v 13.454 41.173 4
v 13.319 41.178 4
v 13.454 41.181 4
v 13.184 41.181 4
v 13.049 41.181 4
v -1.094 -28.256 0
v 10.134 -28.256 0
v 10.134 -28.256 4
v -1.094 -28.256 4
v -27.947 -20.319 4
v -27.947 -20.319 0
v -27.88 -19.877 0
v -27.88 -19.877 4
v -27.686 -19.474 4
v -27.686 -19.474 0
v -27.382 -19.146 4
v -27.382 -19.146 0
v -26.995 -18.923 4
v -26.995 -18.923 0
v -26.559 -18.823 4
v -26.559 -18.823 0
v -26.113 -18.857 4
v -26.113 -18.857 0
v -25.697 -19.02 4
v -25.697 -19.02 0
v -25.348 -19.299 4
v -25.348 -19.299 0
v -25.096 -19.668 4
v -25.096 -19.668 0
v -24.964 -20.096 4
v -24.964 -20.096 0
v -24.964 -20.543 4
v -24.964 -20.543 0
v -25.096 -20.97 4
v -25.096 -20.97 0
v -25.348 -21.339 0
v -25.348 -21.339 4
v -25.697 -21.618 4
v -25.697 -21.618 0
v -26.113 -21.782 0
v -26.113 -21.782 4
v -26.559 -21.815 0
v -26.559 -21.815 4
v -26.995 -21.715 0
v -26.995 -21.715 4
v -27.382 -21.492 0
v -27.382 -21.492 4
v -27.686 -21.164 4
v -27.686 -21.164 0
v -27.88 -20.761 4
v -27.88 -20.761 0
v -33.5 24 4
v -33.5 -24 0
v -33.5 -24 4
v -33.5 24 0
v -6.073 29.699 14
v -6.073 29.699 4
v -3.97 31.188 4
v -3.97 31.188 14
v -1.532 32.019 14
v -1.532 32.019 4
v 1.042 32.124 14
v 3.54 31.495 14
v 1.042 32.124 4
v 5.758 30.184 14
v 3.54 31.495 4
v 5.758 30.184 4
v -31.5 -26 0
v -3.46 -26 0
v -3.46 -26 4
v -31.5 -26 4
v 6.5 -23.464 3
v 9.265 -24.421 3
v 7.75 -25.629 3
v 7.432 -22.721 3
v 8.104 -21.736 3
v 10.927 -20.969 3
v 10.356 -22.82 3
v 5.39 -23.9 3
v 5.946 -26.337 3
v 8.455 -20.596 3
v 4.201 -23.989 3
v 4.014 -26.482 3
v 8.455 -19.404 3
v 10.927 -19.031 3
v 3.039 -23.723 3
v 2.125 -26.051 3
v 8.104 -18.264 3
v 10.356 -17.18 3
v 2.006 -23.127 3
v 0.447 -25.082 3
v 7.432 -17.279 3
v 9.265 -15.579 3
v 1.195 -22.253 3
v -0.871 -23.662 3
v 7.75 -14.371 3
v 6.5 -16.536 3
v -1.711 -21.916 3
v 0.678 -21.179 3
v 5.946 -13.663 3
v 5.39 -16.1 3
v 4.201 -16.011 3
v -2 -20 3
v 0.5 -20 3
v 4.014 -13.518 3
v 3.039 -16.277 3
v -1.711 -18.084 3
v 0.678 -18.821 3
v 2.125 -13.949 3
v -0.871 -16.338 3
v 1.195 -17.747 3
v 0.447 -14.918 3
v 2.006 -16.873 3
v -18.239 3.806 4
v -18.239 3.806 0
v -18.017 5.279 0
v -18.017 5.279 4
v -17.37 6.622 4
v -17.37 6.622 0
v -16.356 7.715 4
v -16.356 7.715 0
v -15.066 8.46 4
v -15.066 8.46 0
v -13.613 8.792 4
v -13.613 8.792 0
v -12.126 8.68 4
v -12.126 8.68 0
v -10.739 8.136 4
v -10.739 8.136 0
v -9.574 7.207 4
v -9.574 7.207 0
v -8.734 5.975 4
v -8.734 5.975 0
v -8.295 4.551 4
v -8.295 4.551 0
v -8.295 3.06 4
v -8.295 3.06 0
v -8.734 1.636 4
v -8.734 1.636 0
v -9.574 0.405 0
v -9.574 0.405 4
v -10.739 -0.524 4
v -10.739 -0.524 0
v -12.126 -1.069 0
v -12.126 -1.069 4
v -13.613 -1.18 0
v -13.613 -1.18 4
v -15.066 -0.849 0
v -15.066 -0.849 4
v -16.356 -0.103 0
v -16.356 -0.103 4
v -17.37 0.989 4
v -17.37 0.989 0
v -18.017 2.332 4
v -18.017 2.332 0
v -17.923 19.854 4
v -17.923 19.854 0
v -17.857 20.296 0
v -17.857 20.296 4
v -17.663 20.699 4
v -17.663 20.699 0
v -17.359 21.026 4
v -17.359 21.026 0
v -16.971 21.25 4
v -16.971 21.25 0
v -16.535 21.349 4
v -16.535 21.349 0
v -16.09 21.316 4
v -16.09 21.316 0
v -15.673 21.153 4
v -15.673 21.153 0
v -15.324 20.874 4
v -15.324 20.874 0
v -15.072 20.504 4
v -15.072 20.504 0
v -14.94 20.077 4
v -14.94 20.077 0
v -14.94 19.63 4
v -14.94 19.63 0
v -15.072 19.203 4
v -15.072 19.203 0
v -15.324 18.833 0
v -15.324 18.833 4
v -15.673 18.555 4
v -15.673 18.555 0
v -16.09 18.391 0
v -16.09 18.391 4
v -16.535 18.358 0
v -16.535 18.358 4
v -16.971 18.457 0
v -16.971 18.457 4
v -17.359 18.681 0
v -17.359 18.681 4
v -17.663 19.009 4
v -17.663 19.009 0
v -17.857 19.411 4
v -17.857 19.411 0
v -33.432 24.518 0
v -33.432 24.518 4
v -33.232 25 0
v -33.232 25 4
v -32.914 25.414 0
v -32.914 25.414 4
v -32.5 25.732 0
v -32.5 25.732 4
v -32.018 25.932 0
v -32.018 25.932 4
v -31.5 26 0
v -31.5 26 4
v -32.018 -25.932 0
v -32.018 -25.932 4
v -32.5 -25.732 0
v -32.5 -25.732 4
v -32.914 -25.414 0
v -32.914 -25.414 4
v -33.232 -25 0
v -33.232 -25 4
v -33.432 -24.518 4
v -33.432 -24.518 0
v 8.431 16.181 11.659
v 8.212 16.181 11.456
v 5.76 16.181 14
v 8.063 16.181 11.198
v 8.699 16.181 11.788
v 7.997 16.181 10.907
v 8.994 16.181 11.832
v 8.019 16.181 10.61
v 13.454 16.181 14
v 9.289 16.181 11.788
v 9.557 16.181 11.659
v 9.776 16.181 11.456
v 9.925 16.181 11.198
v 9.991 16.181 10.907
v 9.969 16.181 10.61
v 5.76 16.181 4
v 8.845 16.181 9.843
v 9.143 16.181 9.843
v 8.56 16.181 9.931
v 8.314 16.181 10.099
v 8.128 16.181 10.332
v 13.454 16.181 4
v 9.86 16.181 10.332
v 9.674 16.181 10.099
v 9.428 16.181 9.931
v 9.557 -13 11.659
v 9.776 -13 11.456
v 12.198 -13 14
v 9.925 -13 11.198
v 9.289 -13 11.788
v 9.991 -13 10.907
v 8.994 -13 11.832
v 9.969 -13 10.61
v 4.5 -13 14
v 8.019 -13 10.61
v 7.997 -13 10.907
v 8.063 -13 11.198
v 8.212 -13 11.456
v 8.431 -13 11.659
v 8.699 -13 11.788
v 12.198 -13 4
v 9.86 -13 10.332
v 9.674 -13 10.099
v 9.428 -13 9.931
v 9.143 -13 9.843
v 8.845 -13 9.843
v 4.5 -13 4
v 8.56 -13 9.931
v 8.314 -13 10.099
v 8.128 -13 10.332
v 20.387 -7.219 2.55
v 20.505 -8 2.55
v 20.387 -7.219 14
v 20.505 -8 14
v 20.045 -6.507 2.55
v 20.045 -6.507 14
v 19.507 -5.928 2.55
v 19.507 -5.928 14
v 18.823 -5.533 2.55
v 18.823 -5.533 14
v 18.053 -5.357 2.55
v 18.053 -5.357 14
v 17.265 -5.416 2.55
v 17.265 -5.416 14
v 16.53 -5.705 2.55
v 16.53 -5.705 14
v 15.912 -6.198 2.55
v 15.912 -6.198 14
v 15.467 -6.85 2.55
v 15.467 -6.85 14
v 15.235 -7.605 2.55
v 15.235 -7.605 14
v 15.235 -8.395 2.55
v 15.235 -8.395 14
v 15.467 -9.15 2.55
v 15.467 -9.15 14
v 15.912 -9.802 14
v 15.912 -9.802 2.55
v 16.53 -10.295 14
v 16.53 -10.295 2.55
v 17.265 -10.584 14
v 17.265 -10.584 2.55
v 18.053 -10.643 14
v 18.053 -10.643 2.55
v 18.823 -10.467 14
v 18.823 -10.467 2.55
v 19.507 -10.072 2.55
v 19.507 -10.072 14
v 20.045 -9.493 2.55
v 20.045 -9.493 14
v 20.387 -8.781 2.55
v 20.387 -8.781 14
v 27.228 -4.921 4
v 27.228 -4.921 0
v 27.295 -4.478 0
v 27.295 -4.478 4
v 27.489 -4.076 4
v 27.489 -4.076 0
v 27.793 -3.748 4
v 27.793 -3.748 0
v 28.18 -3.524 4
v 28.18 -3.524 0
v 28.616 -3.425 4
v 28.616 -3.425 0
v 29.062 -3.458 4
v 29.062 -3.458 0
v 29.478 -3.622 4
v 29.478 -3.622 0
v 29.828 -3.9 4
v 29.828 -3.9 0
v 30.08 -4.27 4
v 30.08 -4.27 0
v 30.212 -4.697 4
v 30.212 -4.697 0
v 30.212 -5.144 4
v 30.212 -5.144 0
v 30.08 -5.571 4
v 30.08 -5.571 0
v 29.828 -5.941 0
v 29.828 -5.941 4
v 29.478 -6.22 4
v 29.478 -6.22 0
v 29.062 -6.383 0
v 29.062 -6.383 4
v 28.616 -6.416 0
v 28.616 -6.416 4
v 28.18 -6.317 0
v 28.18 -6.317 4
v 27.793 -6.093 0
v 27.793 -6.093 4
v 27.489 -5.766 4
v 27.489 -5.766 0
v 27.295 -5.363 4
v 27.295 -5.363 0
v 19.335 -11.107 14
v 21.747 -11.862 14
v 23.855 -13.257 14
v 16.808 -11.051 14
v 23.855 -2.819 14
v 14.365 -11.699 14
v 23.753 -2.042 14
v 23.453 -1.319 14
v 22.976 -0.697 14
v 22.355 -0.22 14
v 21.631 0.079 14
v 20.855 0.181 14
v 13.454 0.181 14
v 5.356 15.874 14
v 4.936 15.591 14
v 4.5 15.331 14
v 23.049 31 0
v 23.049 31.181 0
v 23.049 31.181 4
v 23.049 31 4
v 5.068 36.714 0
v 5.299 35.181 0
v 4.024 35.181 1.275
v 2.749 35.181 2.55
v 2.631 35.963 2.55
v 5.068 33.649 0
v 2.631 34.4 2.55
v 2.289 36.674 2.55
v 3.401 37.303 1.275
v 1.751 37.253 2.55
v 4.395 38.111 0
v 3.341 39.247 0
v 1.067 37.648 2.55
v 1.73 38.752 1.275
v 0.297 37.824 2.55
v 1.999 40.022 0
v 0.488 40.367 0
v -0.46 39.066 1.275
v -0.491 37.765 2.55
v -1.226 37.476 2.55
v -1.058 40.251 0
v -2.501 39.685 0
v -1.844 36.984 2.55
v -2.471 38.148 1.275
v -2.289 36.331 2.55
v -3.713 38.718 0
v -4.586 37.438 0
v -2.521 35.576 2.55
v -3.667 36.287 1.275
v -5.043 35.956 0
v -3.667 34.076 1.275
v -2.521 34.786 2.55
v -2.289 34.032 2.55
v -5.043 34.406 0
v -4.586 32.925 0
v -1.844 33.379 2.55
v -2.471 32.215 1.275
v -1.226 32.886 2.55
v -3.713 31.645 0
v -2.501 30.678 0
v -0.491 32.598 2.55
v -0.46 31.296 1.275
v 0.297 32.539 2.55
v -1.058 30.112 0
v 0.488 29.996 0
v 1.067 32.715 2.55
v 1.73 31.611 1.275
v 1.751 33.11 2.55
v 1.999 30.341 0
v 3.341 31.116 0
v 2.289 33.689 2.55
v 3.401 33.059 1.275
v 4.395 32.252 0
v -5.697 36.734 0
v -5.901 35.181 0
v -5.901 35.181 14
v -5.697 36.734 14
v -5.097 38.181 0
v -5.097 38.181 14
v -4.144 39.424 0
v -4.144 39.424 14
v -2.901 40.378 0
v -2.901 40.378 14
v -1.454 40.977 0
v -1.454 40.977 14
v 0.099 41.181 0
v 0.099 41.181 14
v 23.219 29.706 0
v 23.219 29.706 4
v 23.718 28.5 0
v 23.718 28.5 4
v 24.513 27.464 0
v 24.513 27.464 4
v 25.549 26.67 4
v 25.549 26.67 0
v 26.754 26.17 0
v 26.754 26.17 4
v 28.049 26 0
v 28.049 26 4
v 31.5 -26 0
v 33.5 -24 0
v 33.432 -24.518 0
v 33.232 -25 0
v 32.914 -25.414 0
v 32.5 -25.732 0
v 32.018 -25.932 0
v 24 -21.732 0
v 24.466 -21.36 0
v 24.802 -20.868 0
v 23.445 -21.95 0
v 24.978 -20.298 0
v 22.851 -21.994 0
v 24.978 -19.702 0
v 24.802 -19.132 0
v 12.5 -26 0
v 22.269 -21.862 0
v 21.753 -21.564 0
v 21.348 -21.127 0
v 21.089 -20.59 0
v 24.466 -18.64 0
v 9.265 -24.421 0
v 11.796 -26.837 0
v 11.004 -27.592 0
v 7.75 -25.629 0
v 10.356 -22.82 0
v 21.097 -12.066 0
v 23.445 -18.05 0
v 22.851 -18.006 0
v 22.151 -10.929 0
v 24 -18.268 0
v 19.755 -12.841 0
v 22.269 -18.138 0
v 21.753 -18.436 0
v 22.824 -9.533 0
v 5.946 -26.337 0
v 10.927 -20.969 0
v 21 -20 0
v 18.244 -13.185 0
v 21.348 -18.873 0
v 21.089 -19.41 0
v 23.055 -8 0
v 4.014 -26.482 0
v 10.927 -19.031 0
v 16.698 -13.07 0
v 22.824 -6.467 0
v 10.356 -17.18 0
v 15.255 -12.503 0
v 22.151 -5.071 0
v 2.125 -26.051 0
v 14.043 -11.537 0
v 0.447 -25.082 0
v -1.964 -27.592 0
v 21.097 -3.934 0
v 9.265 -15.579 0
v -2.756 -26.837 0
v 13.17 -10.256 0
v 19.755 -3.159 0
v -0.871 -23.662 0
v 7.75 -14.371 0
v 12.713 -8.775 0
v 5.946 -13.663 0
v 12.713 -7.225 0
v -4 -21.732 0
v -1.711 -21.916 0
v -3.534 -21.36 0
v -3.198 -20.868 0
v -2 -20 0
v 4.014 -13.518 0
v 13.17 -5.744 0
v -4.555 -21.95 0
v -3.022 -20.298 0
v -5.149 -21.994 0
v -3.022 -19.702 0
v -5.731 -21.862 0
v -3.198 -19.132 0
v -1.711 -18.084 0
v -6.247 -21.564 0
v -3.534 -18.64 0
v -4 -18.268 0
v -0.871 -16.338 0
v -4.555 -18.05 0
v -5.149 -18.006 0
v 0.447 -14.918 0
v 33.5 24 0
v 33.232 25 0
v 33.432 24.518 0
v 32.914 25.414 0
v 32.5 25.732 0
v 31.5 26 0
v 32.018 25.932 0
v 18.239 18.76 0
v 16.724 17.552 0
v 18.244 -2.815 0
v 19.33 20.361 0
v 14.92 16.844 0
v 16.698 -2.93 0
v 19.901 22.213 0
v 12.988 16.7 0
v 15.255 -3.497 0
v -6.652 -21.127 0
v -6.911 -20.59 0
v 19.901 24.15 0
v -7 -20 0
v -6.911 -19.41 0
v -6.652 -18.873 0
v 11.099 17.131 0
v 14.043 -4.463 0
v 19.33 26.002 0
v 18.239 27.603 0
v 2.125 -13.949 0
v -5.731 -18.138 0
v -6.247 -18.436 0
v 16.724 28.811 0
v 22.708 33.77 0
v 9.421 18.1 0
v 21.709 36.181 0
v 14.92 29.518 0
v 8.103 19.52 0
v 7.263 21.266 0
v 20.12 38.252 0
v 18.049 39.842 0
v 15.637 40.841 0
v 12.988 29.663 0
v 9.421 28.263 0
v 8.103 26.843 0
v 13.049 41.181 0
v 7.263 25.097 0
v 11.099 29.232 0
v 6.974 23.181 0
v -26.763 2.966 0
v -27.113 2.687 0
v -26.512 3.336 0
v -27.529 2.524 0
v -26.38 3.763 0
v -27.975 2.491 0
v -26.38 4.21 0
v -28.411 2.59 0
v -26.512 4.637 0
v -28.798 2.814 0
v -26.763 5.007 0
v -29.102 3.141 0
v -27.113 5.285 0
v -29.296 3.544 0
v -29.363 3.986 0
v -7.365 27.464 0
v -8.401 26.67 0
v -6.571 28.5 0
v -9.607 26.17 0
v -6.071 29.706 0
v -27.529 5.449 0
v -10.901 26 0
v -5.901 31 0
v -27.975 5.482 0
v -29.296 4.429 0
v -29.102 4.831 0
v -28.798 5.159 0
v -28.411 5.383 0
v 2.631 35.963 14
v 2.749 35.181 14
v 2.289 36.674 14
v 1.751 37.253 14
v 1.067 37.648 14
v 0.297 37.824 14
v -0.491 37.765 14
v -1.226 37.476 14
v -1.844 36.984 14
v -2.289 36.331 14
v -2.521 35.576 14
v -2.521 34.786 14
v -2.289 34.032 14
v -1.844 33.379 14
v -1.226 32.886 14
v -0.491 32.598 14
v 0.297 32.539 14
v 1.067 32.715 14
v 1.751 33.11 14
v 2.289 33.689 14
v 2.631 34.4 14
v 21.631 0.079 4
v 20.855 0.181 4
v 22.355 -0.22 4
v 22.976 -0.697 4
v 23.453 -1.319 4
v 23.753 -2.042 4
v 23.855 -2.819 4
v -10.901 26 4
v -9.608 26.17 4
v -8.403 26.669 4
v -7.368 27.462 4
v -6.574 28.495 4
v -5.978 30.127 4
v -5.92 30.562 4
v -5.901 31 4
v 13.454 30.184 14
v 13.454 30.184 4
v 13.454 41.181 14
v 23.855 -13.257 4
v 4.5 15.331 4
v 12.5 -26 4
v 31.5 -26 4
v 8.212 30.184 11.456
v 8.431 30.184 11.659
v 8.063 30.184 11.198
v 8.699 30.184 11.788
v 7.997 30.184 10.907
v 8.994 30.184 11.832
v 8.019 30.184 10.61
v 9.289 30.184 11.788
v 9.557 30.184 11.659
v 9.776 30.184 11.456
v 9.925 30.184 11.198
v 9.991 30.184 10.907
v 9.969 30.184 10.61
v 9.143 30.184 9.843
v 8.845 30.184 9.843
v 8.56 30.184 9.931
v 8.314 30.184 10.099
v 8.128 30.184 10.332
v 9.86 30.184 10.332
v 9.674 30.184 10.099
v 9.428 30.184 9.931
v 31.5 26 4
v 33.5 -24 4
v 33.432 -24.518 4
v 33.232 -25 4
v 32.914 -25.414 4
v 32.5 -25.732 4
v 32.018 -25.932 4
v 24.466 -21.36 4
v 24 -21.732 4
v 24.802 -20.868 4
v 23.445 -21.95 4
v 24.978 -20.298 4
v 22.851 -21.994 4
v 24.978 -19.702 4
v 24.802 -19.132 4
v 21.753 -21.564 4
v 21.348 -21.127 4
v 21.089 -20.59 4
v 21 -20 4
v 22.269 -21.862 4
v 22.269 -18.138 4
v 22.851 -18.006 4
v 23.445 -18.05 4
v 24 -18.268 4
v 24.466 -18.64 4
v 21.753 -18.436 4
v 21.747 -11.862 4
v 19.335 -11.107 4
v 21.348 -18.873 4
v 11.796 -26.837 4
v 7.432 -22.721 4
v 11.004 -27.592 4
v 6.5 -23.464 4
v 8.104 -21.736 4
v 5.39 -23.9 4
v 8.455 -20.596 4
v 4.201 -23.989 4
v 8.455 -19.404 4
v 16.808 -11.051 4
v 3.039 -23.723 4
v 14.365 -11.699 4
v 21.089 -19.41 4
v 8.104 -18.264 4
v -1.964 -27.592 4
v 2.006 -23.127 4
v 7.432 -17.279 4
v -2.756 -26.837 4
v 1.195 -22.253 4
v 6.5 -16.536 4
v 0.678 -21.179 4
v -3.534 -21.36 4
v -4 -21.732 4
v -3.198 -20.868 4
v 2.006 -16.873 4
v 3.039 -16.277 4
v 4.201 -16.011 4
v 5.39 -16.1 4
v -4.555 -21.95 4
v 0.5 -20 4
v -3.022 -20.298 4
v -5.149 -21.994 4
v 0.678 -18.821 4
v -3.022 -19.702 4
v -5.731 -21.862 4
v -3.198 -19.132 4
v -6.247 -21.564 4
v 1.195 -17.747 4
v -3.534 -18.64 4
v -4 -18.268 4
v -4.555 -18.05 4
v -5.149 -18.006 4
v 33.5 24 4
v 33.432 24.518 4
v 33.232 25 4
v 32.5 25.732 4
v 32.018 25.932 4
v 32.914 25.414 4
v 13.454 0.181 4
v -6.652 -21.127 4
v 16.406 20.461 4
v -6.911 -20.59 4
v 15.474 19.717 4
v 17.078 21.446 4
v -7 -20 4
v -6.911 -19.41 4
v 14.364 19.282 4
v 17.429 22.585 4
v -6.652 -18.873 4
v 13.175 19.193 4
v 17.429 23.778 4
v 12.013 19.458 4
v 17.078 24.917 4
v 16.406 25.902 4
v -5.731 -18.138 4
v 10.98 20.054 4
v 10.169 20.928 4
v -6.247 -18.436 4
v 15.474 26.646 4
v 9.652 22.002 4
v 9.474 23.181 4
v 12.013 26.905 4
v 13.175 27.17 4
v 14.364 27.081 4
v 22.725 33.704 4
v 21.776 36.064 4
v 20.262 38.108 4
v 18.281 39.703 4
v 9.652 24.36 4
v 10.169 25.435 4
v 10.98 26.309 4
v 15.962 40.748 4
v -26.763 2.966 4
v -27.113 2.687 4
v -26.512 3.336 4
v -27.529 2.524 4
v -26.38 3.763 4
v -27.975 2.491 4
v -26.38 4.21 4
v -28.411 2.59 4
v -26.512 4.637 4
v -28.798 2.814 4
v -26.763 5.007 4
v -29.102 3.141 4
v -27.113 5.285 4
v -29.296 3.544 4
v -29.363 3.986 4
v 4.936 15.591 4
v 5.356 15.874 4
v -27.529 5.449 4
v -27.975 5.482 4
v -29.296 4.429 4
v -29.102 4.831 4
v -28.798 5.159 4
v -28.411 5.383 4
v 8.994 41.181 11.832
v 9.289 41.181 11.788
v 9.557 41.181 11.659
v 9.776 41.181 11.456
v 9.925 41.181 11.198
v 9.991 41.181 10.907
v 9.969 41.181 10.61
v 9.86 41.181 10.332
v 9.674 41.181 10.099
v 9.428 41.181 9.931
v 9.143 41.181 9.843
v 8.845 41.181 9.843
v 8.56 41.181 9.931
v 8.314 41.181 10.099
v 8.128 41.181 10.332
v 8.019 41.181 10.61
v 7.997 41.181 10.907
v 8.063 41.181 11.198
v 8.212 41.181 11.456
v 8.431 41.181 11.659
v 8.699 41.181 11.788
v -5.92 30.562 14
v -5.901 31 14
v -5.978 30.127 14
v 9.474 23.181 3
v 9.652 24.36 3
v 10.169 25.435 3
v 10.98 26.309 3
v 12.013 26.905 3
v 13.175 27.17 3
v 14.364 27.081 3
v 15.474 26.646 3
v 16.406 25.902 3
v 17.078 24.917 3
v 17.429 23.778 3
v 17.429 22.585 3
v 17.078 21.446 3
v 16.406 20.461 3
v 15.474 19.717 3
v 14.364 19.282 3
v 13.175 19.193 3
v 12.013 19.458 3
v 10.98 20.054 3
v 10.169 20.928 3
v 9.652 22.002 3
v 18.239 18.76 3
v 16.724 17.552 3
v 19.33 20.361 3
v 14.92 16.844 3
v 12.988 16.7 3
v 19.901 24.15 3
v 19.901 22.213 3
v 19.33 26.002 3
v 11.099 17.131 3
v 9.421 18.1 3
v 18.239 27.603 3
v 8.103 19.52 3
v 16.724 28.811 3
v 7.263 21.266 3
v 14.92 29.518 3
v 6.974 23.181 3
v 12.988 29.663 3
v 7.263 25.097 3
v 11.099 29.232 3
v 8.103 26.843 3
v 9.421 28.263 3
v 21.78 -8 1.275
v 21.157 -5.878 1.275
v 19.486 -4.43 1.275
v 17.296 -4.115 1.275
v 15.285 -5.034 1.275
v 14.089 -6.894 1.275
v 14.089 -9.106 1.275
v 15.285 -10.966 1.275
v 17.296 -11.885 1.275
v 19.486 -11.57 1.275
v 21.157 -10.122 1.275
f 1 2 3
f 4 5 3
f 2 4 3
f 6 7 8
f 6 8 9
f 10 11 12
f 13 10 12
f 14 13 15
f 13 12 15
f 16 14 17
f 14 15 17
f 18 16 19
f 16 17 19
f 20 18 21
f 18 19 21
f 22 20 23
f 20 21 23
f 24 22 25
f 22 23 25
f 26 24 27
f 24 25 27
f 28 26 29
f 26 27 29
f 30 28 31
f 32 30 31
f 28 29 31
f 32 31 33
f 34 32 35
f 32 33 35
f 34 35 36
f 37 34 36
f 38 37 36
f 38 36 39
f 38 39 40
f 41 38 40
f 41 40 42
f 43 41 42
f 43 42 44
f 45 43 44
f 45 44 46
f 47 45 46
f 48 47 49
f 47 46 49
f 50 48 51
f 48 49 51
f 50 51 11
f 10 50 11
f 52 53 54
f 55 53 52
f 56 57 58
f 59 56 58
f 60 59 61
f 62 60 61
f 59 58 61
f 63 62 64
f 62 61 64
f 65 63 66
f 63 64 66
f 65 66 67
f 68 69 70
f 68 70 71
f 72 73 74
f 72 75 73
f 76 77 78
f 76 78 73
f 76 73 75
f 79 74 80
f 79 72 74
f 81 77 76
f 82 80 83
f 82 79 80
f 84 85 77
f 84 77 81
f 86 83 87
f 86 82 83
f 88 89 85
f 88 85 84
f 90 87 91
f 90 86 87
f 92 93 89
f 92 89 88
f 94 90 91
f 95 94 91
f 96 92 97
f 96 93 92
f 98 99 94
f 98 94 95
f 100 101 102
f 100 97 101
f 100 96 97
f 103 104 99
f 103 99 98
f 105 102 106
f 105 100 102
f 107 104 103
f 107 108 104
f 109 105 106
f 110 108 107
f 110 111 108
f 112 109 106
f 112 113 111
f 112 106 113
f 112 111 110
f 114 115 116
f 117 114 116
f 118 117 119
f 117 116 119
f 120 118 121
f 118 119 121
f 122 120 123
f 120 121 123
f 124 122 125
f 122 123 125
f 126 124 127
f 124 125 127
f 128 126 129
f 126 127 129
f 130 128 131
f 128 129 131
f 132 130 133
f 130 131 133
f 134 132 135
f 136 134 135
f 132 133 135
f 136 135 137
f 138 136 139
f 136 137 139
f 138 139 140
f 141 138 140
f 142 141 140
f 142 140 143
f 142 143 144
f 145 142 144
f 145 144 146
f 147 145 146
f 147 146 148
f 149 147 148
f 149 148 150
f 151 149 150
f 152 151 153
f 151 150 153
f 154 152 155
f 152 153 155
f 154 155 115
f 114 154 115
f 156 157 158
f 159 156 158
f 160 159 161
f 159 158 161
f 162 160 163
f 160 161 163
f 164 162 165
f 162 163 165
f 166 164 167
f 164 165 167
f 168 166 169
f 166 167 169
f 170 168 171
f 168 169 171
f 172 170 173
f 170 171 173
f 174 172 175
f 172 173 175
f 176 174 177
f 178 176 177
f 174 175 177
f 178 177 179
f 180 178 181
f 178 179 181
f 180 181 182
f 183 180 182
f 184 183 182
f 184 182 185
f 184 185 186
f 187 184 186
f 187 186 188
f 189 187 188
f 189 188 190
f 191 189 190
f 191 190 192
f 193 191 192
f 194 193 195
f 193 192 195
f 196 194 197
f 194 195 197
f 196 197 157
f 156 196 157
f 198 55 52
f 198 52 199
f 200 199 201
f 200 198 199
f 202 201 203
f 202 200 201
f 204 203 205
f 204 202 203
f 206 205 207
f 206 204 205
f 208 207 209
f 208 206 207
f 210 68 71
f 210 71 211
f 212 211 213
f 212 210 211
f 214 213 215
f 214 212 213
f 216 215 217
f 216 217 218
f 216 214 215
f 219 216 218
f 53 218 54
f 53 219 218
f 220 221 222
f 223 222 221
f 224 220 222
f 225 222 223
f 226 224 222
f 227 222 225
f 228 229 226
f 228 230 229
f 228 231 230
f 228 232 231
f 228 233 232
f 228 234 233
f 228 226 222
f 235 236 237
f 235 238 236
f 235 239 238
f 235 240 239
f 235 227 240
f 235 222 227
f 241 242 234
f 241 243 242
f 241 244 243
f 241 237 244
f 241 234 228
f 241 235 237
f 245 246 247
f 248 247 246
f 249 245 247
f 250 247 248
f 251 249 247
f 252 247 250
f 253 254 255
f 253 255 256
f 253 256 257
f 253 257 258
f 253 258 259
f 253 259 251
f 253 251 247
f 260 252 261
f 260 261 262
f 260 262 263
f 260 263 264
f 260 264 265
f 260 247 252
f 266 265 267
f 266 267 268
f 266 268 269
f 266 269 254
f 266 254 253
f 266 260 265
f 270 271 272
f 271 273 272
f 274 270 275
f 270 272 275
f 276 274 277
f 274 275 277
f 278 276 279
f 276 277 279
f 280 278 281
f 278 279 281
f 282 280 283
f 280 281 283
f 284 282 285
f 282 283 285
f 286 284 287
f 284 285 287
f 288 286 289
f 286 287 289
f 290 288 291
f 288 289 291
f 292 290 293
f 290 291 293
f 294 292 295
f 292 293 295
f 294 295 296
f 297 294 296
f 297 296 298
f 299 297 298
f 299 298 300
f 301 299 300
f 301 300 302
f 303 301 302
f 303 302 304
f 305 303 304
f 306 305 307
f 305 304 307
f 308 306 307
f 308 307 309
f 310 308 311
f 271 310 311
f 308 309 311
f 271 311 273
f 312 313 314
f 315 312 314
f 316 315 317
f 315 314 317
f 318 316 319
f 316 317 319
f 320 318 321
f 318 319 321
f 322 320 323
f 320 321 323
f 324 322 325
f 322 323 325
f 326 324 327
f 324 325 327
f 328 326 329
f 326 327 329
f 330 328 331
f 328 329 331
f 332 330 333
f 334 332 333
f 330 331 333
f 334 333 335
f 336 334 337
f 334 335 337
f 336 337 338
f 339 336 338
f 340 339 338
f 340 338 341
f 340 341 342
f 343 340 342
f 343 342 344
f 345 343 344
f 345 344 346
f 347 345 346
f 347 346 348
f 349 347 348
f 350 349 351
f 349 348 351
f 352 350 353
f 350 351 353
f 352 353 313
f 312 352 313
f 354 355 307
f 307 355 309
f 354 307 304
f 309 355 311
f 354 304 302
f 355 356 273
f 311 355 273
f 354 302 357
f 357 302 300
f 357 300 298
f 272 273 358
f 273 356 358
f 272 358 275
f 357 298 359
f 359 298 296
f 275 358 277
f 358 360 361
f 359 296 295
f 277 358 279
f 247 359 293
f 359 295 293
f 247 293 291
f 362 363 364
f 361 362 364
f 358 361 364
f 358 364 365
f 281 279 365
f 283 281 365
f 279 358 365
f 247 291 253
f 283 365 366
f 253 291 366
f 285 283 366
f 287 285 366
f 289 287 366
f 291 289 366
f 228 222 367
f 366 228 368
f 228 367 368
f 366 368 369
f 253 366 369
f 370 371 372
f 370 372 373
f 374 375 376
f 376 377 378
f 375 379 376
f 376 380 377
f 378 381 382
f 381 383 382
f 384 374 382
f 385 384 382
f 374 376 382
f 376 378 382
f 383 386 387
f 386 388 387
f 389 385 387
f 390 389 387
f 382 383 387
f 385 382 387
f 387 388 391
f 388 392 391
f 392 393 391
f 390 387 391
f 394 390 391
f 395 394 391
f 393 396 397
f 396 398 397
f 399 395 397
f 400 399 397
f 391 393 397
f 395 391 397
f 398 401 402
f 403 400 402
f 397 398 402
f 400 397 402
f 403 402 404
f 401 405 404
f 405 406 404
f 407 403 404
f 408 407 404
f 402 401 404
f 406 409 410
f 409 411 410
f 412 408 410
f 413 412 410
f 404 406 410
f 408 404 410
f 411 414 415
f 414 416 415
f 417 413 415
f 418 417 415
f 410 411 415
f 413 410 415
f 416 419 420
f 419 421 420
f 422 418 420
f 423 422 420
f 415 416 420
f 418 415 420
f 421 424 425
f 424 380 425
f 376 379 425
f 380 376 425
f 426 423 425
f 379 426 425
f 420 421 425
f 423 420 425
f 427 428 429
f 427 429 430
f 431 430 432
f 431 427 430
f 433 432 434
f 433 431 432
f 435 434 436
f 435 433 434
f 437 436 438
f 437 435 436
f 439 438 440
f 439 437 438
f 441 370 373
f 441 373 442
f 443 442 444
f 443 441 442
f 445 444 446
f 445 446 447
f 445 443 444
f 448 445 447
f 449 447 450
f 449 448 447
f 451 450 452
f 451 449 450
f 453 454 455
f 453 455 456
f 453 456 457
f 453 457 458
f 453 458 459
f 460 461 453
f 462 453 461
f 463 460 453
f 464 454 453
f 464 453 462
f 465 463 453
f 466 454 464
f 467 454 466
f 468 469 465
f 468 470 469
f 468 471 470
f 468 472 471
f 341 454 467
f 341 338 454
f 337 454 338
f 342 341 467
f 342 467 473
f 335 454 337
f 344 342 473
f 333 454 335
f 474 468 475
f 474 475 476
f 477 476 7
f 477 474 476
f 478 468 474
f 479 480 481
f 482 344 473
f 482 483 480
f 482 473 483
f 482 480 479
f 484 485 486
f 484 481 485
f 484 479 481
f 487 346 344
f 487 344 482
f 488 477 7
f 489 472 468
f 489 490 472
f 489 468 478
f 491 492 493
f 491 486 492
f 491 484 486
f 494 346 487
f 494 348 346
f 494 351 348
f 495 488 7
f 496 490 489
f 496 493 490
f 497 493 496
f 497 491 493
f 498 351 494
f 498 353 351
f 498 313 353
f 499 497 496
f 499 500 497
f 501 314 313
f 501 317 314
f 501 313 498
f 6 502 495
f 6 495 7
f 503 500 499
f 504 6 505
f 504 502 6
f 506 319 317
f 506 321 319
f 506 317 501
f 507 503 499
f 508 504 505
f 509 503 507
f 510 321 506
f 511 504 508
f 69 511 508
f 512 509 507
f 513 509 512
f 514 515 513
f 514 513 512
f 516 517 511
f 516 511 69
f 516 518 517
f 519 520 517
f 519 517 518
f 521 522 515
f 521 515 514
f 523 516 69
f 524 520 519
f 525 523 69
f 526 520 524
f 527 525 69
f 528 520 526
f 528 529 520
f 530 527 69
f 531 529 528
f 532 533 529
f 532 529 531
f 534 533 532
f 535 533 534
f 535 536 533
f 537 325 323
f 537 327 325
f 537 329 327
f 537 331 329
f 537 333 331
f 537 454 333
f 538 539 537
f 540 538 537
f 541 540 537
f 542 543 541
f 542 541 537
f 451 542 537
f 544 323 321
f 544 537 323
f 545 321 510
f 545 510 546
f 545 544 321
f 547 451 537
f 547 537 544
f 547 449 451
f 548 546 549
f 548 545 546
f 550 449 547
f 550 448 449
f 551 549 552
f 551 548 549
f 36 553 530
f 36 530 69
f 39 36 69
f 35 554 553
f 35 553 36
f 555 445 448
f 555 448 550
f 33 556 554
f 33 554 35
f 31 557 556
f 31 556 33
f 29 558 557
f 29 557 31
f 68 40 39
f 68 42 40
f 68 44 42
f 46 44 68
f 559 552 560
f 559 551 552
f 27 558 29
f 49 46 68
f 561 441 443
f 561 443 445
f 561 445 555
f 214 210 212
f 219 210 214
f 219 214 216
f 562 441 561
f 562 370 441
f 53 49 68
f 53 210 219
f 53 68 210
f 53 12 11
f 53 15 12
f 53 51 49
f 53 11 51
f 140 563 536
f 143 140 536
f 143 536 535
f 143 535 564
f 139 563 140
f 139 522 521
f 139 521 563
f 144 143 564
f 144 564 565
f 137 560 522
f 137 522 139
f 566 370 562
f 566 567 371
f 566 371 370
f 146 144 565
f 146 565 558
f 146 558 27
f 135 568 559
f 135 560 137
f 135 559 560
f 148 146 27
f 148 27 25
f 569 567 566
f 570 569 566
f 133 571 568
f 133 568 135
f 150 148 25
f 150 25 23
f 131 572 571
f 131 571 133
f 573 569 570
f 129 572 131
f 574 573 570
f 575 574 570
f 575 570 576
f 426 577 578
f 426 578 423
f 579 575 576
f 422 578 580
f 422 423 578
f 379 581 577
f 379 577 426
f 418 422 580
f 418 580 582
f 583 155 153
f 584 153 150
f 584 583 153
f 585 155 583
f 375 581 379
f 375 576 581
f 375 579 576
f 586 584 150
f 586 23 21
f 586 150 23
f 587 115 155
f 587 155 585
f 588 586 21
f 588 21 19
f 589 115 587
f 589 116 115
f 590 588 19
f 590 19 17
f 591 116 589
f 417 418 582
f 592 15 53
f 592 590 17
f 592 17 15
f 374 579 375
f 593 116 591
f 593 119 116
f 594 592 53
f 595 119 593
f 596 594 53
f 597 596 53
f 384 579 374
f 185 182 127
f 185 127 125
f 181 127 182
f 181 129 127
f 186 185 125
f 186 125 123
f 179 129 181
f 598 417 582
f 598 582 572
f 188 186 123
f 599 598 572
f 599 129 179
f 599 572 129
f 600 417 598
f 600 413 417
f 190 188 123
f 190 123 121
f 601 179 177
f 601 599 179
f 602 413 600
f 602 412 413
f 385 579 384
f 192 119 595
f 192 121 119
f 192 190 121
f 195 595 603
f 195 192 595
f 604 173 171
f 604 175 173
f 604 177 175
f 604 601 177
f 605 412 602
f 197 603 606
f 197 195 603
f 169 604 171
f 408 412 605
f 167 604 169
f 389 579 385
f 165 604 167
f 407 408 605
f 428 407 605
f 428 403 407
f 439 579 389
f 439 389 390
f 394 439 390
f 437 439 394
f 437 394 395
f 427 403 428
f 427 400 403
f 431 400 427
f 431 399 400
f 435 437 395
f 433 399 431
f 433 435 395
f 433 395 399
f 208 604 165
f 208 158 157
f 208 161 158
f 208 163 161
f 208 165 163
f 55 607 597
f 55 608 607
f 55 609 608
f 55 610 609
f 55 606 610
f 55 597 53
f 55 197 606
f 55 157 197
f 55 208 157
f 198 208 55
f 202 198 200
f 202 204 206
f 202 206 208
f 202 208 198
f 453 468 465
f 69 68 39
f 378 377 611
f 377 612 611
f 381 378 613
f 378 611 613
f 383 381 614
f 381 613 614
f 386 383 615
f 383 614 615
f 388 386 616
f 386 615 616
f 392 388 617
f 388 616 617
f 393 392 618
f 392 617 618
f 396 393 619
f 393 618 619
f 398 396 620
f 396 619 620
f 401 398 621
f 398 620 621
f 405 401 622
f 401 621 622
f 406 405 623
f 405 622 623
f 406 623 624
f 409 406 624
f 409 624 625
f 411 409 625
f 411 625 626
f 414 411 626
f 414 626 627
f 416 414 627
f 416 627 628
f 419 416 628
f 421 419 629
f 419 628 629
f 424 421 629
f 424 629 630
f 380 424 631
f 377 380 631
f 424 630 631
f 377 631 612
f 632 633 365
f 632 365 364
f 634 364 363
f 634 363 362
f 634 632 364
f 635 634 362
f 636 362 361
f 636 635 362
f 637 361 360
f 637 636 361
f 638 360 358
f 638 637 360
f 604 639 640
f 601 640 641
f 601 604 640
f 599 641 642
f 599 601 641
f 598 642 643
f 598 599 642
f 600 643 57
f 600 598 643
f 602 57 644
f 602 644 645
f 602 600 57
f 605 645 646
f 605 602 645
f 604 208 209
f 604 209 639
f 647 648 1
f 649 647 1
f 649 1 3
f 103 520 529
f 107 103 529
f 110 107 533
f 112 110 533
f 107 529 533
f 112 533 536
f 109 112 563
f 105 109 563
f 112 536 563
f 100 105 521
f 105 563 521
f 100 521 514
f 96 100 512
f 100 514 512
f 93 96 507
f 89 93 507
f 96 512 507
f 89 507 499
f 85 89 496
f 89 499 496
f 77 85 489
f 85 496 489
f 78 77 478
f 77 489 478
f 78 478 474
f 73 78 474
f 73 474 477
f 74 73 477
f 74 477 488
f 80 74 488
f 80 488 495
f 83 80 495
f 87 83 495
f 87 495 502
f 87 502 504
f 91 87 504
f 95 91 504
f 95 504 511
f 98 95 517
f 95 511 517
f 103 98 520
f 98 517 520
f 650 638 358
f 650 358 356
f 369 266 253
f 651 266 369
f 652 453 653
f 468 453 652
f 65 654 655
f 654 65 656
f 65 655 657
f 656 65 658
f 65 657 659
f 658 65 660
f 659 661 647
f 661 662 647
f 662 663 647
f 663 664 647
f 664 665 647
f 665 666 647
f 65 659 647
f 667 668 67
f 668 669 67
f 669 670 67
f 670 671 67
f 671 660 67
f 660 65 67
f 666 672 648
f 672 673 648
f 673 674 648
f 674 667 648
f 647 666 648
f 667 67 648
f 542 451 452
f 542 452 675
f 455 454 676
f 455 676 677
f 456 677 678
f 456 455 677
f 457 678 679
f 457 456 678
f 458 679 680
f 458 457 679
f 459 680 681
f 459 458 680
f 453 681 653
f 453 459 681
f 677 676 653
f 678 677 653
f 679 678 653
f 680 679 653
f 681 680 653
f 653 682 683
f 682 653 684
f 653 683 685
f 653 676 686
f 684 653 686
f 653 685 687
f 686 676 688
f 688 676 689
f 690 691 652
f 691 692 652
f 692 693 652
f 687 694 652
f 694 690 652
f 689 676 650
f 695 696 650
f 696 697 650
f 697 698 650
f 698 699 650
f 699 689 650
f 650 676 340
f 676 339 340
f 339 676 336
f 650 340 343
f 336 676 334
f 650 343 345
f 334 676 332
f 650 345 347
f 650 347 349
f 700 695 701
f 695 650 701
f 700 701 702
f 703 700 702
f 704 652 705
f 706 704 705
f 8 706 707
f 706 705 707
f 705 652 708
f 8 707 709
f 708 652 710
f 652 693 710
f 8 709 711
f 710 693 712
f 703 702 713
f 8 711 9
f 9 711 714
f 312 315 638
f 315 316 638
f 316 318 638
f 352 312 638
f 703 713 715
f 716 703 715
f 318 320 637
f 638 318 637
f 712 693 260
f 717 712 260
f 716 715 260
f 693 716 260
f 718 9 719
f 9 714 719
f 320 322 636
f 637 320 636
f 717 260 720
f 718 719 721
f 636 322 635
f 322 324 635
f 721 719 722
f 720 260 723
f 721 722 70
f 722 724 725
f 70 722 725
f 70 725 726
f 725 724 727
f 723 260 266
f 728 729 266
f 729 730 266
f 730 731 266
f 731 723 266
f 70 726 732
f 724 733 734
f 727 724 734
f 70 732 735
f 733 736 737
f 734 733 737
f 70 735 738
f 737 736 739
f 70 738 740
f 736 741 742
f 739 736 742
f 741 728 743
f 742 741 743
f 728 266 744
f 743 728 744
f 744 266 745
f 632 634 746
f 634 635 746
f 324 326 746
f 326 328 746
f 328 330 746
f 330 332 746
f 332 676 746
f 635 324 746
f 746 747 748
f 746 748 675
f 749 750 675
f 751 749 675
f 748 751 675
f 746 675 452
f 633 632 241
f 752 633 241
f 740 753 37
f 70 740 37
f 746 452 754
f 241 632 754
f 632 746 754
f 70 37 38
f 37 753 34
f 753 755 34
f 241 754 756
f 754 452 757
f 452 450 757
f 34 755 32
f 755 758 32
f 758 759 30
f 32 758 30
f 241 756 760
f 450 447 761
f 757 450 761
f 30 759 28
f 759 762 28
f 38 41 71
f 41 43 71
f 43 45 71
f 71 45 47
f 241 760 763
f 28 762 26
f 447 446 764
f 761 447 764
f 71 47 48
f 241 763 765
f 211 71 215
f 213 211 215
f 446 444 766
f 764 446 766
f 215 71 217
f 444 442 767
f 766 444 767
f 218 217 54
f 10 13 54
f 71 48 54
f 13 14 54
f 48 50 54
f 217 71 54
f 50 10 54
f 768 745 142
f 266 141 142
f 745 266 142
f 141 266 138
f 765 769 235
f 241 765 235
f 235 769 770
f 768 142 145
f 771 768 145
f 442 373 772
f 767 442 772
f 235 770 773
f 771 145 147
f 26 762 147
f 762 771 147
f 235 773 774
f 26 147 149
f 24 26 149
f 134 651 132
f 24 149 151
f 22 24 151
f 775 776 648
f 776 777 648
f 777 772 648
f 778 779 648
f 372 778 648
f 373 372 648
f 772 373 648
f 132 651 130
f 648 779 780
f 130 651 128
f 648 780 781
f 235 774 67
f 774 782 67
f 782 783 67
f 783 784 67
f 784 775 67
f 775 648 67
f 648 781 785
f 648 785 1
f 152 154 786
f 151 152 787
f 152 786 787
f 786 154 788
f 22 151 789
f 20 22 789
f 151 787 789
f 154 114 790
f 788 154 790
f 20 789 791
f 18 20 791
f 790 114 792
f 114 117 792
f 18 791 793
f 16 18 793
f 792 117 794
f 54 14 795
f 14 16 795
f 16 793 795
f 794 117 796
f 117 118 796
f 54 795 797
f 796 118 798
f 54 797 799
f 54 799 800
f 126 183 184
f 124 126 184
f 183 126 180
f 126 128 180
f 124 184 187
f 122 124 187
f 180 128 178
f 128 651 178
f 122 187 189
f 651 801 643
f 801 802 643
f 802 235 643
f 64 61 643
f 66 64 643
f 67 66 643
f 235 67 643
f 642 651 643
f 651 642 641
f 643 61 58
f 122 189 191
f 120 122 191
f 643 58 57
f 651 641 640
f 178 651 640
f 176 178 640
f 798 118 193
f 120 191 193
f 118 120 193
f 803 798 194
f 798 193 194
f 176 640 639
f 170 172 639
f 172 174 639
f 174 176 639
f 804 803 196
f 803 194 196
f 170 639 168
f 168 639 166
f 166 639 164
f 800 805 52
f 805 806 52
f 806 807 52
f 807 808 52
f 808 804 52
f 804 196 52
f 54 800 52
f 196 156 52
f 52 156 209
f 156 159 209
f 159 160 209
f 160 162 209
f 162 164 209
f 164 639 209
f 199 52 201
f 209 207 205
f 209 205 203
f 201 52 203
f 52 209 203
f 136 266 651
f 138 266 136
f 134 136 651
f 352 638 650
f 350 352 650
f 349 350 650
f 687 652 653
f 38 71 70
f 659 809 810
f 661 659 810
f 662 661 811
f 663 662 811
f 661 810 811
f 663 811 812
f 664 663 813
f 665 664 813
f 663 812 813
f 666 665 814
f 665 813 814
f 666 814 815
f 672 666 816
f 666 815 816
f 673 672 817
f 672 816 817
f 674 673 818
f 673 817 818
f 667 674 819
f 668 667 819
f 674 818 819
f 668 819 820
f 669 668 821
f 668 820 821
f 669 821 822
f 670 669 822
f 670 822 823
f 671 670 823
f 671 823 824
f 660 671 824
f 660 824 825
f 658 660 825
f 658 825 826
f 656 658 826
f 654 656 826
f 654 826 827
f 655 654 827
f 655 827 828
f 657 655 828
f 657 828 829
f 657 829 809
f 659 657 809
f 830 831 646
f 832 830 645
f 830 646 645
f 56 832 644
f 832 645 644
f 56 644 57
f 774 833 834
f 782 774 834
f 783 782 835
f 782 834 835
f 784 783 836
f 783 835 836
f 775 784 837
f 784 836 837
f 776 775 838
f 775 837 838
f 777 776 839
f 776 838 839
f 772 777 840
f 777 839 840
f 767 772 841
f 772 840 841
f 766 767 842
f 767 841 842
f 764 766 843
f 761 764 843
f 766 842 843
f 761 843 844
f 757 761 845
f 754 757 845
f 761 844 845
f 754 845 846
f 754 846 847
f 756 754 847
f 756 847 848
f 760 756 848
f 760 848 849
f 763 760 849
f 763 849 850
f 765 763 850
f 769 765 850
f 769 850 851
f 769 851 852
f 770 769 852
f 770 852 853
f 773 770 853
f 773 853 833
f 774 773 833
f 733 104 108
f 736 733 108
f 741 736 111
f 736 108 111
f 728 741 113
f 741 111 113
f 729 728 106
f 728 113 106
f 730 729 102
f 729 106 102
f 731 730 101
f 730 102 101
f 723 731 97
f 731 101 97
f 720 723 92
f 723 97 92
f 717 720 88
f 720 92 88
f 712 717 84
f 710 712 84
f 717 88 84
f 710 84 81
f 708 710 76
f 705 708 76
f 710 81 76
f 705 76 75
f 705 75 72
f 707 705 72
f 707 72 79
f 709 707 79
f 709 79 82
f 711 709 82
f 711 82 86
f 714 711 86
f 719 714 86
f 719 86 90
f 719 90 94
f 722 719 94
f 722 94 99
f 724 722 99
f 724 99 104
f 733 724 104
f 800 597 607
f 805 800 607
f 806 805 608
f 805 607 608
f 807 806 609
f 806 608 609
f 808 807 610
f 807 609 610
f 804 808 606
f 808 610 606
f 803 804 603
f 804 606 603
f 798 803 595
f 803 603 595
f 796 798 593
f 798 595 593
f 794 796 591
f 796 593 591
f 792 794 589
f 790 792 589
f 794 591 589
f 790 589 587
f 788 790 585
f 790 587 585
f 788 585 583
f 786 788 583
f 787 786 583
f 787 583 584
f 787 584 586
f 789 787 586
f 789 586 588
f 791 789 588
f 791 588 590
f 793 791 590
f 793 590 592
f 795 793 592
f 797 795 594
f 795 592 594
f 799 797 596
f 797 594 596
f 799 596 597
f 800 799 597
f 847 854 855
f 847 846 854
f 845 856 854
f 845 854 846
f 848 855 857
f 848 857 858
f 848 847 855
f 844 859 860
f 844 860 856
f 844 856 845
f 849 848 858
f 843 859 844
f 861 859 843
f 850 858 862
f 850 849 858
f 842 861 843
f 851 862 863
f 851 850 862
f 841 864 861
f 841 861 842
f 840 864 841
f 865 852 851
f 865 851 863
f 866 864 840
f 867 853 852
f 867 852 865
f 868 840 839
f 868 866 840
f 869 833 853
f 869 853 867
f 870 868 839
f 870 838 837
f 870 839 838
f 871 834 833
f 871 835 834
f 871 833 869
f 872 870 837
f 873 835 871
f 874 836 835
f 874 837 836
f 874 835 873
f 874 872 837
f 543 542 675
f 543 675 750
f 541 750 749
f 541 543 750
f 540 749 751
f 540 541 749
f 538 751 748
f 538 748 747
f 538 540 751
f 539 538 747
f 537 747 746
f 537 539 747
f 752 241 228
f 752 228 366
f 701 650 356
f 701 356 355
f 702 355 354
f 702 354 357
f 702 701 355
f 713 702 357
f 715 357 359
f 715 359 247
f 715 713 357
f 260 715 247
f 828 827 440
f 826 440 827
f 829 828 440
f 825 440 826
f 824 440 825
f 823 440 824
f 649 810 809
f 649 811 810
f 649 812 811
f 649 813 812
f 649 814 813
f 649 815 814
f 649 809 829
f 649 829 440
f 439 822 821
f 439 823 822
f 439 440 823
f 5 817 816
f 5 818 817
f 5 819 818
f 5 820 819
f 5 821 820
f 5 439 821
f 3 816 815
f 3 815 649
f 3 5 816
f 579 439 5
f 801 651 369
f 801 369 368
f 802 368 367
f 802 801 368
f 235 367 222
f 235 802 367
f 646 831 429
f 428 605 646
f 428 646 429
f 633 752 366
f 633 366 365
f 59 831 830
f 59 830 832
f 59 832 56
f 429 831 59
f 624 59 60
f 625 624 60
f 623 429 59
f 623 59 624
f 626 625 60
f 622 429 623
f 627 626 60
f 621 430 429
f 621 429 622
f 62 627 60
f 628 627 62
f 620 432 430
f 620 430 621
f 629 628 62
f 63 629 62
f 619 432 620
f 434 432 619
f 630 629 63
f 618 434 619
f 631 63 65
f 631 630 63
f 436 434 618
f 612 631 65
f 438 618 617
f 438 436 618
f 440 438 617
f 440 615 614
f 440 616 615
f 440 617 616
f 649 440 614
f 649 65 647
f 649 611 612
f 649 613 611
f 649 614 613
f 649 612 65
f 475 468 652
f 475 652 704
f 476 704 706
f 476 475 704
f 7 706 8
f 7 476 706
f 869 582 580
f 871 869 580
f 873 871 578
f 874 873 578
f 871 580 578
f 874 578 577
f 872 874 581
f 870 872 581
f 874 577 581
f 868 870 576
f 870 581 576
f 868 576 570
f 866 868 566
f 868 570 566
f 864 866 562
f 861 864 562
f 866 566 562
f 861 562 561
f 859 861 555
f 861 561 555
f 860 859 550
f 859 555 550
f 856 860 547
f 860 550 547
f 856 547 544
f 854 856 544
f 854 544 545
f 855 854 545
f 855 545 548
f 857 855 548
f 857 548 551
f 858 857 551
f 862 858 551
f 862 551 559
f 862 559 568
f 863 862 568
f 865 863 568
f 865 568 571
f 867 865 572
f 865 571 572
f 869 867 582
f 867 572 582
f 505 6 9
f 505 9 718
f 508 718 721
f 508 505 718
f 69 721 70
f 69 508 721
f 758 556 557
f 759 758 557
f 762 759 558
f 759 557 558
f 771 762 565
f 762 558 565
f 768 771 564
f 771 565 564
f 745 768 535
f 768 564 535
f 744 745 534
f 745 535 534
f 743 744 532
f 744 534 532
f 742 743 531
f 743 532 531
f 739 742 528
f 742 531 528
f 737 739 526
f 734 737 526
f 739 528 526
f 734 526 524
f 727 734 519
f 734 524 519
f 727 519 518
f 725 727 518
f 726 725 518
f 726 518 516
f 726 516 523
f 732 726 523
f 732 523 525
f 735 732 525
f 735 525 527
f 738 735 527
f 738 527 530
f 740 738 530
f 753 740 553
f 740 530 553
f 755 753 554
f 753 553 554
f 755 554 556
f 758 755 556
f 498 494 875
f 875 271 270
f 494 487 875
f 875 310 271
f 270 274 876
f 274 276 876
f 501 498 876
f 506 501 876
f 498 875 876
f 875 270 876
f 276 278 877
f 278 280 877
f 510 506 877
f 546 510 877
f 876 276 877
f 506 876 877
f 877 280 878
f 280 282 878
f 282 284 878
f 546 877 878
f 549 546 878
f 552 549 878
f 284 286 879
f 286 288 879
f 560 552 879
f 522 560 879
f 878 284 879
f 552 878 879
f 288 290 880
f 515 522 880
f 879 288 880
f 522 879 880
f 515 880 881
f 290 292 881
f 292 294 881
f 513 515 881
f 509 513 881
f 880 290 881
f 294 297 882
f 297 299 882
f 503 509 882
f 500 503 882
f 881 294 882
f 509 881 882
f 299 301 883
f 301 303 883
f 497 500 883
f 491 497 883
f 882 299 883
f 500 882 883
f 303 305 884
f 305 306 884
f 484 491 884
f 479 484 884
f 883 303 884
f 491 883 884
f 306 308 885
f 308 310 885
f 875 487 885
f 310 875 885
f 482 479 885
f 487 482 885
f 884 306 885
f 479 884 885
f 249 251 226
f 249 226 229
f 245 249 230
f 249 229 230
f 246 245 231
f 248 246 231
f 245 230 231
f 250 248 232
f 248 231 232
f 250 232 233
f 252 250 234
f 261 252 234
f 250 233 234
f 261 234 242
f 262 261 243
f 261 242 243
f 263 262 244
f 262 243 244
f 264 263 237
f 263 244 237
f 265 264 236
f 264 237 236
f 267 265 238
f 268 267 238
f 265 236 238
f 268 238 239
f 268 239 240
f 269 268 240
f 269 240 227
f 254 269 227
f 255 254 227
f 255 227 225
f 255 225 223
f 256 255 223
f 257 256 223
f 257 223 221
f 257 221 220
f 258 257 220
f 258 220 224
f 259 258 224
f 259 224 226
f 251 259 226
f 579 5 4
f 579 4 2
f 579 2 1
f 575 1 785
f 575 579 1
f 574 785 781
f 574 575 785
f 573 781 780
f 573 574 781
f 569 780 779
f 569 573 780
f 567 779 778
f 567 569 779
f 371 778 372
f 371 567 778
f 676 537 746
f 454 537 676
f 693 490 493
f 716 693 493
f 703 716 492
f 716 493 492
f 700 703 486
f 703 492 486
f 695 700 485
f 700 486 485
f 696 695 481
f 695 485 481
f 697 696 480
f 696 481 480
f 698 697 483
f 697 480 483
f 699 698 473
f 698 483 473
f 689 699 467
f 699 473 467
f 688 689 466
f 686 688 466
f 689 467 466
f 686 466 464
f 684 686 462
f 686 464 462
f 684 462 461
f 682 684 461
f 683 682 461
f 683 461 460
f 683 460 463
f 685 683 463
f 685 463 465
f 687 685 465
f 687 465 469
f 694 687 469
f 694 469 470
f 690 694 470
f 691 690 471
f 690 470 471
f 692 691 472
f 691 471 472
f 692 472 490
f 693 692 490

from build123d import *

# Parameters (mm, degrees)
ESBO_O1_R                                       = 2.5
RESSALTO_EXTRUS_O1_DEPTH                        = 4
ESBO_O2_R                                       = 1.5
ESBO_O2_R_2                                     = 5
ESBO_O2_R_3                                     = 4
ESBO_O2_R_4                                     = 2
CORTE_EXTRUS_O1_DEPTH                           = 4
ESBO_O3_R                                       = 6.5
CUT_EXTRUDE1_DEPTH                              = 3
SKETCH1_R                                       = 2.5
BOSS_EXTRUDE1_DEPTH                             = 10
SKETCH2_R                                       = 1
CUT_EXTRUDE3_DEPTH                              = 58
CSK_FOR_M5_FLAT_HEAD_MACHINE_SCREW1_D           = 5.3
CSK_FOR_M5_FLAT_HEAD_MACHINE_SCREW1_CSINK_D     = 10.4
CSK_FOR_M5_FLAT_HEAD_MACHINE_SCREW1_CSINK_ANGLE = 90


with BuildPart() as part:
    # Esboço1 → Ressalto-extrusão1 (new body)
    with BuildSketch(Plane.XY):
        with BuildLine():
            Line((28.048564207, 26.000016667), (31.500000169, 26.000016667))
            ThreePointArc((31.500000169, 26.000016667), (32.914213731, 25.414230229), (33.500000169, 24.000016667))
            Line((33.500000169, 24.000016667), (33.500000169, -24.000016667))
            ThreePointArc((33.500000169, -24.000016667), (32.914213731, -25.414230229), (31.500000169, -26.000016667))
            Line((31.500000169, -26.000016667), (12.499999983, -26.000016667))
            ThreePointArc((12.499999983, -26.000016667), (11.410019713, -27.2255233), (10.134109695, -28.256046043))
            Line((10.134109695, -28.256046043), (-1.094109442, -28.256046043))
            ThreePointArc((-1.094109442, -28.256046043), (-2.37001946, -27.2255233), (-3.45999973, -26.000016667))
            Line((-3.45999973, -26.000016667), (-31.500000169, -26.000016667))
            ThreePointArc((-31.500000169, -26.000016667), (-32.914213731, -25.414230229), (-33.500000169, -24.000016667))
            Line((-33.500000169, -24.000016667), (-33.500000169, 24.000016667))
            ThreePointArc((-33.500000169, 24.000016667), (-32.914213731, 25.414230229), (-31.500000169, 26.000016667))
            Line((-31.500000169, 26.000016667), (-10.901, 26.000016667))
            ThreePointArc((-10.901, 26.000016667), (-7.365466094, 27.464482761), (-5.901, 31.000016667))
            Line((-5.901, 31.000016667), (-5.901, 35.181429851))
            ThreePointArc((-5.901, 35.181429851), (-4.143640687, 39.424070538), (0.099, 41.181429851))
            Line((0.099, 41.181429851), (13.048564207, 41.181429851))
            ThreePointArc((13.048564207, 41.181429851), (20.119632019, 38.252497663), (23.048564207, 31.181429851))
            Line((23.048564207, 31.181429851), (23.048564207, 31.000016667))
            ThreePointArc((23.048564207, 31.000016667), (24.513030301, 27.464482761), (28.048564207, 26.000016667))
        make_face()
        with Locations((0.099, 35.181429851)):
            Circle(ESBO_O1_R, mode=Mode.SUBTRACT)
        with Locations((17.855, -8)):
            Circle(ESBO_O1_R, mode=Mode.SUBTRACT)
    extrude(amount=RESSALTO_EXTRUS_O1_DEPTH)

    # Esboço2 → Corte-extrusão1 (cut)
    with BuildSketch(Plane(origin=(0, 0, 0), x_dir=(-1, 0, 0), z_dir=(0, 0, -1))):
        with Locations((-28.728359433, -4.920628891)):
            Circle(ESBO_O2_R)
        with Locations((16.423325421, 19.853563273)):
            Circle(ESBO_O2_R)
        with Locations((27.863004989, 3.986376213)):
            Circle(ESBO_O2_R)
        with Locations((26.447101695, -20.319132993)):
            Circle(ESBO_O2_R)
        with Locations((13.238926139, 3.805699557)):
            Circle(ESBO_O2_R_2)
        with Locations((-13.474000127, 23.181446518)):
            Circle(ESBO_O2_R_3)
        with Locations((-4.5, -20)):
            Circle(ESBO_O2_R_3)
        with Locations((-23, -20)):
            Circle(ESBO_O2_R_4)
        with Locations((5, -20)):
            Circle(ESBO_O2_R_4)
    extrude(amount=-CORTE_EXTRUS_O1_DEPTH, mode=Mode.SUBTRACT)

    # Esboço3 → Cut-Extrude1 (cut)
    with BuildSketch(Plane(origin=(0, 0, 0), x_dir=(-1, 0, 0), z_dir=(0, 0, -1))):
        with Locations((-13.474000127, 23.181446518)):
            Circle(ESBO_O3_R)
        with Locations((-4.5, -20)):
            Circle(ESBO_O3_R)
    extrude(amount=-CUT_EXTRUDE1_DEPTH, mode=Mode.SUBTRACT)

    # Sketch1 → Boss-Extrude1 (add)
    # profile 1 of 2: a face of its own
    with BuildSketch(Plane.XY.offset(4)):
        with BuildLine():
            Line((13.454, 16.18142986), (13.454, 0.181429851))
            Line((13.454, 0.181429851), (20.855, 0.181429851))
            ThreePointArc((20.855, 0.181429851), (22.976320344, -0.697249805), (23.855, -2.818570149))
            Line((23.855, -2.818570149), (23.855, -13.257131994))
            ThreePointArc((23.855, -13.257131994), (18.073755029, -10.98960381), (12.198145727, -12.999999991))
            Line((12.198145727, -12.999999991), (4.499999978, -12.999999991))
            Line((4.499999978, -12.999999991), (4.499999978, 15.330875804))
            ThreePointArc((4.499999978, 15.330875804), (5.148168847, 15.729461399), (5.76031088, 16.18142986))
            Line((5.76031088, 16.18142986), (13.454, 16.18142986))
        make_face()
        with Locations((17.855, -8)):
            Circle(SKETCH1_R, mode=Mode.SUBTRACT)
    # profile 2 of 2: a face of its own
    with BuildSketch(Plane.XY.offset(4)):
        with BuildLine():
            Line((13.453999976, 41.181429851), (0.099, 41.181429851))
            ThreePointArc((0.099, 41.181429851), (-4.143640687, 39.424070538), (-5.901, 35.181429851))
            Line((-5.901, 35.181429851), (-5.901, 31.000016667))
            ThreePointArc((-5.901, 31.000016667), (-5.944227937, 30.34395972), (-6.073164287, 29.699246768))
            ThreePointArc((-6.073164287, 29.699246768), (-0.248774232, 32.164172288), (5.757624044, 30.183627646))
            Line((5.757624044, 30.183627646), (13.453999976, 30.183627646))
            Line((13.453999976, 30.183627646), (13.453999976, 41.181429851))
        make_face()
        with Locations((0.099, 35.181429851)):
            Circle(SKETCH1_R, mode=Mode.SUBTRACT)
    extrude(amount=BOSS_EXTRUDE1_DEPTH)

    # Sketch2 → Cut-Extrude3 (cut)
    with BuildSketch(Plane(origin=(0, 41.181429851, 0), x_dir=(-1, 0, 0), z_dir=(0, 1, 0))):
        with Locations(Location((-8.993889952, 10.832314202, 0), (0, 0, 90))):
            Circle(SKETCH2_R)
    extrude(amount=-CUT_EXTRUDE3_DEPTH, mode=Mode.SUBTRACT)

    # CSK for M5 Flat Head Machine Screw1 (through all)
    with Locations(Plane(origin=(0, 0, 0), x_dir=(-1, 0, 0), z_dir=(0, 0, -1))):
        with Locations((-0.099, 35.181429851), (-17.855, -8)):
            CounterSinkHole(CSK_FOR_M5_FLAT_HEAD_MACHINE_SCREW1_D / 2, CSK_FOR_M5_FLAT_HEAD_MACHINE_SCREW1_CSINK_D / 2, counter_sink_angle=CSK_FOR_M5_FLAT_HEAD_MACHINE_SCREW1_CSINK_ANGLE)


solid = part.part
